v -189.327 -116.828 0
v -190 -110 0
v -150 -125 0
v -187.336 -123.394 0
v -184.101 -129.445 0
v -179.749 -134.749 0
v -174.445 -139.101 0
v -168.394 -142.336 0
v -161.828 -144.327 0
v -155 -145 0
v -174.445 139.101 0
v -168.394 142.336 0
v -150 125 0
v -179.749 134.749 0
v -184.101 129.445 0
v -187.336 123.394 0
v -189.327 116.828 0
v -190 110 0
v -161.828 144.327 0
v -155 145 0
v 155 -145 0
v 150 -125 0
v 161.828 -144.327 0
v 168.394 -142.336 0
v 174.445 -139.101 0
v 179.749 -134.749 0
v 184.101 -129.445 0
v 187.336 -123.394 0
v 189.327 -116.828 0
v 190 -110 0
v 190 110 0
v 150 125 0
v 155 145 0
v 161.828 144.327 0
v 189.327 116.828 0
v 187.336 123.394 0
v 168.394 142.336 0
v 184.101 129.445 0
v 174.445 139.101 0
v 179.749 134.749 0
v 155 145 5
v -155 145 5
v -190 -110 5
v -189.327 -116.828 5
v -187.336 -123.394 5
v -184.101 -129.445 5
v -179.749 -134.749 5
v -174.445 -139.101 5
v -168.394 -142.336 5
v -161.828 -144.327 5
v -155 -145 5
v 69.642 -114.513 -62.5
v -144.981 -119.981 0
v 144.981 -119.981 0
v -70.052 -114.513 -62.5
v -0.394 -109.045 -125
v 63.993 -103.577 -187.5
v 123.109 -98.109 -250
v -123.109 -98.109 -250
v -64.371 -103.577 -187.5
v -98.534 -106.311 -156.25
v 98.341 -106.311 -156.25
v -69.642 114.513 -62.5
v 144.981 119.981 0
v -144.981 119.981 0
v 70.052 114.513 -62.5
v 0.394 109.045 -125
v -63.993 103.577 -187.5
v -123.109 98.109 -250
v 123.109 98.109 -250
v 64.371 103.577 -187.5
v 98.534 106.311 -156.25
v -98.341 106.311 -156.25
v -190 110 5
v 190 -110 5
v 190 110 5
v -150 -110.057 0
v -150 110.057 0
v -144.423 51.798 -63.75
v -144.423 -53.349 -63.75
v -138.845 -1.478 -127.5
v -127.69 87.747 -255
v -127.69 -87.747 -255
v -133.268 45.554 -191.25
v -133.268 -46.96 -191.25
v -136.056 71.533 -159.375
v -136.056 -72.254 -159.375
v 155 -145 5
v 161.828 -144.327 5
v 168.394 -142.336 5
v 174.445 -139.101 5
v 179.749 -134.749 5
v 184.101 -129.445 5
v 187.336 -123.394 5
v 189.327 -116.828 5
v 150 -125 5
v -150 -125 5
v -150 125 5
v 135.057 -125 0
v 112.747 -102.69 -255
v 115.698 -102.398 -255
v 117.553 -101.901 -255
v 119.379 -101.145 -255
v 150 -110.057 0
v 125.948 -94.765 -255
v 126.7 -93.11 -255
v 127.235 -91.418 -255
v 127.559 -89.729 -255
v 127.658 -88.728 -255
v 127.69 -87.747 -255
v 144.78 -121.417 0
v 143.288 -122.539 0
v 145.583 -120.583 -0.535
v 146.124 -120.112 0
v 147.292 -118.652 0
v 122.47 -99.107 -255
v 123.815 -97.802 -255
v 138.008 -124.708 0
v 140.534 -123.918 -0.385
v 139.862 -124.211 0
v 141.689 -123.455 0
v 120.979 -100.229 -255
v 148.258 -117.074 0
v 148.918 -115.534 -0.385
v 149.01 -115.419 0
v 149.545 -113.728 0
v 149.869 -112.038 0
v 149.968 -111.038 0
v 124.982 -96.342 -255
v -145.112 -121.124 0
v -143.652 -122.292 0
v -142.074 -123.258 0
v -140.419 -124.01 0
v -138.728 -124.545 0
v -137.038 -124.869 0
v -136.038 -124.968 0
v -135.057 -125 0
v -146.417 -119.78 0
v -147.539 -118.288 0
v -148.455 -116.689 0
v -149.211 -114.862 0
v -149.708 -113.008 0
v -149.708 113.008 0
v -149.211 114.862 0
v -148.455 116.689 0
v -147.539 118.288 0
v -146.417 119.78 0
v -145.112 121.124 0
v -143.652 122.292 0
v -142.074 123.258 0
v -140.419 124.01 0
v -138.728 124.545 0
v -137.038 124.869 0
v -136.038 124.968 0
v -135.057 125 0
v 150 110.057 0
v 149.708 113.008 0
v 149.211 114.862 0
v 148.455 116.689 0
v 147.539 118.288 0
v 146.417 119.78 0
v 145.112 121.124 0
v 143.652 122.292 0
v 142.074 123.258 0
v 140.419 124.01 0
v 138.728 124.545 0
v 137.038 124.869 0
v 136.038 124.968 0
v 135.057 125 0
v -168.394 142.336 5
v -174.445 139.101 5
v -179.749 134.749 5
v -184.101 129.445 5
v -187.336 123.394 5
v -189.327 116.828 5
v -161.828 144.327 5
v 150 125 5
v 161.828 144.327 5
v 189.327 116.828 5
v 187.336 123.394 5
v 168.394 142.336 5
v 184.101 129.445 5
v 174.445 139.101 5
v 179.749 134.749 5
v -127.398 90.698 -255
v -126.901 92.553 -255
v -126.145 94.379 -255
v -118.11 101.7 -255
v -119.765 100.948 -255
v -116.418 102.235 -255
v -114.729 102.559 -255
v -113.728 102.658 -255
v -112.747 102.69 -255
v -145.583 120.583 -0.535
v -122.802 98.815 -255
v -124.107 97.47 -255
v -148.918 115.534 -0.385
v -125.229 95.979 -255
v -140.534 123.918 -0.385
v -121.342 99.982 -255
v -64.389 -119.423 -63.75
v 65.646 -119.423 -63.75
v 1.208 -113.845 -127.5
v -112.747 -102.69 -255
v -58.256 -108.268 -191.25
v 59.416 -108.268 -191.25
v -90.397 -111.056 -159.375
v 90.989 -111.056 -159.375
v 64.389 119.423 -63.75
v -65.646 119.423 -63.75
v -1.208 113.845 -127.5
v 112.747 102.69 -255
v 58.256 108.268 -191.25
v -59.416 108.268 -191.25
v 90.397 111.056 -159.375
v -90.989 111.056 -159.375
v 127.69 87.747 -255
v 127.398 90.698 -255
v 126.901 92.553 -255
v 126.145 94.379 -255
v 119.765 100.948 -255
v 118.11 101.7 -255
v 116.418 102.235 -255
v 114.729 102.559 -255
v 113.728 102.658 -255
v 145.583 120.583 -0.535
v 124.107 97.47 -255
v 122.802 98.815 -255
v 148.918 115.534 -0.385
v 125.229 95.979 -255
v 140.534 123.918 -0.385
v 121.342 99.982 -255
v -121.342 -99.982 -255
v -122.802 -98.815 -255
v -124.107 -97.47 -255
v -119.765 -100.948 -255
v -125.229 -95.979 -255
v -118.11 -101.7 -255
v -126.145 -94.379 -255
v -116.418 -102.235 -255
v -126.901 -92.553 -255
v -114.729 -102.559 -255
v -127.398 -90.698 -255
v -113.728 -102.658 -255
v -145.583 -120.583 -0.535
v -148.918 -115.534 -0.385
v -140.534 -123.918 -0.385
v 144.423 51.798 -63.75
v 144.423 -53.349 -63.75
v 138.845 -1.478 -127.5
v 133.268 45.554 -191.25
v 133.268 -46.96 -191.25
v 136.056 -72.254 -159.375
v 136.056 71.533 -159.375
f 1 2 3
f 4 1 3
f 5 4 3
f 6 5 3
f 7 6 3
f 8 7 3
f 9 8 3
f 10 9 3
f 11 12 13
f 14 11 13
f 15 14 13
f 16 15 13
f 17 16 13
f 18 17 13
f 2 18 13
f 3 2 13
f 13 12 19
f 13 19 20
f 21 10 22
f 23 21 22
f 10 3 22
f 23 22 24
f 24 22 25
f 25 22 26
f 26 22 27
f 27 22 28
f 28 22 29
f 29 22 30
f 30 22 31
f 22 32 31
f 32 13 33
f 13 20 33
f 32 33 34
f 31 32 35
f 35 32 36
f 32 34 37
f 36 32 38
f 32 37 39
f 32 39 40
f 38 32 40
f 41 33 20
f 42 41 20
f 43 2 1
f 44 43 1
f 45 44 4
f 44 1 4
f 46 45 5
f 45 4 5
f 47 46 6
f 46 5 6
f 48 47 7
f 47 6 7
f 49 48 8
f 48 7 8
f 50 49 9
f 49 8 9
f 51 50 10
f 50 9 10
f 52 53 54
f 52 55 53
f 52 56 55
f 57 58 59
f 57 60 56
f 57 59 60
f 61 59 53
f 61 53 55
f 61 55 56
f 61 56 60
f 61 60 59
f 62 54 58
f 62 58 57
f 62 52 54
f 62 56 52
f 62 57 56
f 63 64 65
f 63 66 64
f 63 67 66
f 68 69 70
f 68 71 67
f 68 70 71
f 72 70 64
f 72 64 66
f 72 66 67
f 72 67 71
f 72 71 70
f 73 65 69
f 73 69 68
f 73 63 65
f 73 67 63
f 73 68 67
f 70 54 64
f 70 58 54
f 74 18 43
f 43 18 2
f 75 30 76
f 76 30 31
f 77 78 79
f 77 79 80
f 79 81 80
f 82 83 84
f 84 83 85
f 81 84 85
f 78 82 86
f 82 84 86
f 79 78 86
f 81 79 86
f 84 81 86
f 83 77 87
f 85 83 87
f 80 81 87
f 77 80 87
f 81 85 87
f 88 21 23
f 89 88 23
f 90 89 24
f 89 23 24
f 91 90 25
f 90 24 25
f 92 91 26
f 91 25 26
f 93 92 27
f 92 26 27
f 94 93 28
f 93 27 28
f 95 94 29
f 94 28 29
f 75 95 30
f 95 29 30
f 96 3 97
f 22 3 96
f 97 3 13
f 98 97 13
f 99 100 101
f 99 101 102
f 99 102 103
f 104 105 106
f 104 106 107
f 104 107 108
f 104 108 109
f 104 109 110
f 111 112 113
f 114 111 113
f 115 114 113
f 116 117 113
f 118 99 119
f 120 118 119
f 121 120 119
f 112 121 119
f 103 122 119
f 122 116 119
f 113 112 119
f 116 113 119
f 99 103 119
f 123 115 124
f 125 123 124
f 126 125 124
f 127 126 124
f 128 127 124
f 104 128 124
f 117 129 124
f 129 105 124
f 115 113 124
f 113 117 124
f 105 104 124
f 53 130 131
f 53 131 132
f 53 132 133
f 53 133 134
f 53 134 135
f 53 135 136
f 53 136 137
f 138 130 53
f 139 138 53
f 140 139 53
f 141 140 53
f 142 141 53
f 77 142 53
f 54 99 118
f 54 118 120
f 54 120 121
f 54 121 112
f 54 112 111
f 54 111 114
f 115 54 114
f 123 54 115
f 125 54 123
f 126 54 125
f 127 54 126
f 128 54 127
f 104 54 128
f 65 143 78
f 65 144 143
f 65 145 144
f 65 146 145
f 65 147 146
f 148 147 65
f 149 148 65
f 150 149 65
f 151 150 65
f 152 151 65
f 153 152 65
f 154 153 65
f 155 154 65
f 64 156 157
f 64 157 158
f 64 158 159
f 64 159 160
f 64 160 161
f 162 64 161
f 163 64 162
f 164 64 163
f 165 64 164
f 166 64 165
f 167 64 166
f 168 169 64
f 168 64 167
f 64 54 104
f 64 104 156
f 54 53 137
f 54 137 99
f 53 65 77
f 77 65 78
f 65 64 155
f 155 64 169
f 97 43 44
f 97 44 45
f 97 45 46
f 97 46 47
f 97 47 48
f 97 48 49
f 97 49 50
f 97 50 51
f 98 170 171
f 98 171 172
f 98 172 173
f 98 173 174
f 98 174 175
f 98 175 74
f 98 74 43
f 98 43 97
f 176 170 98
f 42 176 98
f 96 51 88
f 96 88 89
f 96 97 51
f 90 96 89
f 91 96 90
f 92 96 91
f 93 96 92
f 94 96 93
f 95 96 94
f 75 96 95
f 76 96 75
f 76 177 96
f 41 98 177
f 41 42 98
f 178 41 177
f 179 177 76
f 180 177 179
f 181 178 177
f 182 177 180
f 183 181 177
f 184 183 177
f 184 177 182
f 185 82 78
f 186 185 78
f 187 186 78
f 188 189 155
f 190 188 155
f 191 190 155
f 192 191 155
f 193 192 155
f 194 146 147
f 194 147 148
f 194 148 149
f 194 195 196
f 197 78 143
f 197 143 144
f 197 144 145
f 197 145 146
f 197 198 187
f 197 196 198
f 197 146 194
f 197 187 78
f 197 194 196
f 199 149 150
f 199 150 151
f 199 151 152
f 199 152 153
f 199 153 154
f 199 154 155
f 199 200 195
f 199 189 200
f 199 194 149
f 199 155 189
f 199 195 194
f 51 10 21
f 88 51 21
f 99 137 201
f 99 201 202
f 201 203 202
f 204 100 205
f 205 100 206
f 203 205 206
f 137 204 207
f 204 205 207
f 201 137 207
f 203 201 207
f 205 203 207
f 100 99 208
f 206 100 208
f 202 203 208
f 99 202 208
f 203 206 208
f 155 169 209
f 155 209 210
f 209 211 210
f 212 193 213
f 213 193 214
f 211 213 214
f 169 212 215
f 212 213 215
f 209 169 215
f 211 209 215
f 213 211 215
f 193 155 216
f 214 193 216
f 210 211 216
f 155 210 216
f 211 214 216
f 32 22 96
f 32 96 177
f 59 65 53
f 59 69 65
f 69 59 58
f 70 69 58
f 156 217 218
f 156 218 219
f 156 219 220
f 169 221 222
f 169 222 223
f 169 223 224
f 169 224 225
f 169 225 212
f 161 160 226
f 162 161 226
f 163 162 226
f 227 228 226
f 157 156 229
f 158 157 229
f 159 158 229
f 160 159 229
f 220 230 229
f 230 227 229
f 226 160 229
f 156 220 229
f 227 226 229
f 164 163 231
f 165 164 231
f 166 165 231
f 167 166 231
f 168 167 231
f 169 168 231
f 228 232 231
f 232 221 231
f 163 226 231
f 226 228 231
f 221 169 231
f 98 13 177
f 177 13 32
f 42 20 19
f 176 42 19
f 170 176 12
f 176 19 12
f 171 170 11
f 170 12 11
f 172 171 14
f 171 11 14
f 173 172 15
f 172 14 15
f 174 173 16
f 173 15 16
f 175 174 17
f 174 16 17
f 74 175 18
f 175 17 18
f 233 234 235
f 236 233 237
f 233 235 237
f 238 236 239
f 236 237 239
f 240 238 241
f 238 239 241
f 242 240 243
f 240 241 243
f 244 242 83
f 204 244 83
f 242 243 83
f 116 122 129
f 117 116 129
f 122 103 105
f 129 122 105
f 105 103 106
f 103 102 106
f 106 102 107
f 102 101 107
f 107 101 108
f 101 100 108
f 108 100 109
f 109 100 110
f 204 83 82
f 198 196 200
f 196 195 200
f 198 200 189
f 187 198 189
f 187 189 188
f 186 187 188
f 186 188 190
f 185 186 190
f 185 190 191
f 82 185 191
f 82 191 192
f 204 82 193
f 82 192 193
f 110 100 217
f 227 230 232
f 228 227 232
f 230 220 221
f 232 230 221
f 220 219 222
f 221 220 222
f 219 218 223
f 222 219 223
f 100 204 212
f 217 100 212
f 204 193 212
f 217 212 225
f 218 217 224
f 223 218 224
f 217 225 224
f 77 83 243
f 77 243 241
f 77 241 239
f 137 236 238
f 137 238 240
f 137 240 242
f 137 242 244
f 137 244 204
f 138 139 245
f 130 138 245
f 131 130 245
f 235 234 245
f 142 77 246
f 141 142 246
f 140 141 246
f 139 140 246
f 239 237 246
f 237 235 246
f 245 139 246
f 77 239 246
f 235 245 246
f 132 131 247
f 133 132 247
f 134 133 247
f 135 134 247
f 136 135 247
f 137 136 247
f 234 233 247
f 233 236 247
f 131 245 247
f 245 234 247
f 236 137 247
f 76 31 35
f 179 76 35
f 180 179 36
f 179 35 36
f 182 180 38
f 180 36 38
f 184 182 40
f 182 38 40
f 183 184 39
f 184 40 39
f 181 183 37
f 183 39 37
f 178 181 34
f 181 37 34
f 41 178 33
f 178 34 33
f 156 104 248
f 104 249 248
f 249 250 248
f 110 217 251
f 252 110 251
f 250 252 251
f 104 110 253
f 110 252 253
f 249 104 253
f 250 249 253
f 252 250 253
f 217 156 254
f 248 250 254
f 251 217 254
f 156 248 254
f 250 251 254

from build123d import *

# Parameters (mm, degrees)
F0_W     = 300
F0_H     = 250
F1_DEPTH = 255
F1_TAPER = 5
F2_T     = -5
F3_W     = 300
F3_H     = 250
F4_DEPTH = 5
F5_R     = 15


with BuildPart() as f1:
    # F0 (on Top) → F1 (new body)
    with BuildSketch(Plane.XY):
        Rectangle(F0_W, F0_H)
    extrude(amount=-F1_DEPTH, taper=F1_TAPER)

    # F2
    f2_openings = [f1.faces().sort_by_distance(p)[0] for p in [
        (0, 0, 0),
    ]]
    offset(amount=F2_T, openings=f2_openings)

    # F5
    f5_edges = [f1.edges().sort_by_distance(p)[0] for p in [
        (-138.845195, 113.845195, -127.5),
        (-138.845195, -113.845195, -127.5),
        (138.845195, -113.845195, -127.5),
        (138.845195, 113.845195, -127.5),
    ]]
    fillet(f5_edges, radius=F5_R)


with BuildPart() as f4:
    # F3 (on face) → F4 (new body)
    with BuildSketch(Plane.XY):
        with BuildLine():
            ThreePointArc((190, 110), (179.7487373415, 134.7487373415), (155, 145))
            Line((155, 145), (-155, 145))
            ThreePointArc((-155, 145), (-179.7487373415, 134.7487373415), (-190, 110))
            Line((-190, 110), (-190, -110))
            ThreePointArc((-190, -110), (-179.7487373415, -134.7487373415), (-155, -145))
            Line((-155, -145), (155, -145))
            ThreePointArc((155, -145), (179.7487373415, -134.7487373415), (190, -110))
            Line((190, -110), (190, 110))
        make_face()
        Rectangle(F3_W, F3_H, mode=Mode.SUBTRACT)
    extrude(amount=F4_DEPTH)


solid = Compound([f1.part, f4.part])
